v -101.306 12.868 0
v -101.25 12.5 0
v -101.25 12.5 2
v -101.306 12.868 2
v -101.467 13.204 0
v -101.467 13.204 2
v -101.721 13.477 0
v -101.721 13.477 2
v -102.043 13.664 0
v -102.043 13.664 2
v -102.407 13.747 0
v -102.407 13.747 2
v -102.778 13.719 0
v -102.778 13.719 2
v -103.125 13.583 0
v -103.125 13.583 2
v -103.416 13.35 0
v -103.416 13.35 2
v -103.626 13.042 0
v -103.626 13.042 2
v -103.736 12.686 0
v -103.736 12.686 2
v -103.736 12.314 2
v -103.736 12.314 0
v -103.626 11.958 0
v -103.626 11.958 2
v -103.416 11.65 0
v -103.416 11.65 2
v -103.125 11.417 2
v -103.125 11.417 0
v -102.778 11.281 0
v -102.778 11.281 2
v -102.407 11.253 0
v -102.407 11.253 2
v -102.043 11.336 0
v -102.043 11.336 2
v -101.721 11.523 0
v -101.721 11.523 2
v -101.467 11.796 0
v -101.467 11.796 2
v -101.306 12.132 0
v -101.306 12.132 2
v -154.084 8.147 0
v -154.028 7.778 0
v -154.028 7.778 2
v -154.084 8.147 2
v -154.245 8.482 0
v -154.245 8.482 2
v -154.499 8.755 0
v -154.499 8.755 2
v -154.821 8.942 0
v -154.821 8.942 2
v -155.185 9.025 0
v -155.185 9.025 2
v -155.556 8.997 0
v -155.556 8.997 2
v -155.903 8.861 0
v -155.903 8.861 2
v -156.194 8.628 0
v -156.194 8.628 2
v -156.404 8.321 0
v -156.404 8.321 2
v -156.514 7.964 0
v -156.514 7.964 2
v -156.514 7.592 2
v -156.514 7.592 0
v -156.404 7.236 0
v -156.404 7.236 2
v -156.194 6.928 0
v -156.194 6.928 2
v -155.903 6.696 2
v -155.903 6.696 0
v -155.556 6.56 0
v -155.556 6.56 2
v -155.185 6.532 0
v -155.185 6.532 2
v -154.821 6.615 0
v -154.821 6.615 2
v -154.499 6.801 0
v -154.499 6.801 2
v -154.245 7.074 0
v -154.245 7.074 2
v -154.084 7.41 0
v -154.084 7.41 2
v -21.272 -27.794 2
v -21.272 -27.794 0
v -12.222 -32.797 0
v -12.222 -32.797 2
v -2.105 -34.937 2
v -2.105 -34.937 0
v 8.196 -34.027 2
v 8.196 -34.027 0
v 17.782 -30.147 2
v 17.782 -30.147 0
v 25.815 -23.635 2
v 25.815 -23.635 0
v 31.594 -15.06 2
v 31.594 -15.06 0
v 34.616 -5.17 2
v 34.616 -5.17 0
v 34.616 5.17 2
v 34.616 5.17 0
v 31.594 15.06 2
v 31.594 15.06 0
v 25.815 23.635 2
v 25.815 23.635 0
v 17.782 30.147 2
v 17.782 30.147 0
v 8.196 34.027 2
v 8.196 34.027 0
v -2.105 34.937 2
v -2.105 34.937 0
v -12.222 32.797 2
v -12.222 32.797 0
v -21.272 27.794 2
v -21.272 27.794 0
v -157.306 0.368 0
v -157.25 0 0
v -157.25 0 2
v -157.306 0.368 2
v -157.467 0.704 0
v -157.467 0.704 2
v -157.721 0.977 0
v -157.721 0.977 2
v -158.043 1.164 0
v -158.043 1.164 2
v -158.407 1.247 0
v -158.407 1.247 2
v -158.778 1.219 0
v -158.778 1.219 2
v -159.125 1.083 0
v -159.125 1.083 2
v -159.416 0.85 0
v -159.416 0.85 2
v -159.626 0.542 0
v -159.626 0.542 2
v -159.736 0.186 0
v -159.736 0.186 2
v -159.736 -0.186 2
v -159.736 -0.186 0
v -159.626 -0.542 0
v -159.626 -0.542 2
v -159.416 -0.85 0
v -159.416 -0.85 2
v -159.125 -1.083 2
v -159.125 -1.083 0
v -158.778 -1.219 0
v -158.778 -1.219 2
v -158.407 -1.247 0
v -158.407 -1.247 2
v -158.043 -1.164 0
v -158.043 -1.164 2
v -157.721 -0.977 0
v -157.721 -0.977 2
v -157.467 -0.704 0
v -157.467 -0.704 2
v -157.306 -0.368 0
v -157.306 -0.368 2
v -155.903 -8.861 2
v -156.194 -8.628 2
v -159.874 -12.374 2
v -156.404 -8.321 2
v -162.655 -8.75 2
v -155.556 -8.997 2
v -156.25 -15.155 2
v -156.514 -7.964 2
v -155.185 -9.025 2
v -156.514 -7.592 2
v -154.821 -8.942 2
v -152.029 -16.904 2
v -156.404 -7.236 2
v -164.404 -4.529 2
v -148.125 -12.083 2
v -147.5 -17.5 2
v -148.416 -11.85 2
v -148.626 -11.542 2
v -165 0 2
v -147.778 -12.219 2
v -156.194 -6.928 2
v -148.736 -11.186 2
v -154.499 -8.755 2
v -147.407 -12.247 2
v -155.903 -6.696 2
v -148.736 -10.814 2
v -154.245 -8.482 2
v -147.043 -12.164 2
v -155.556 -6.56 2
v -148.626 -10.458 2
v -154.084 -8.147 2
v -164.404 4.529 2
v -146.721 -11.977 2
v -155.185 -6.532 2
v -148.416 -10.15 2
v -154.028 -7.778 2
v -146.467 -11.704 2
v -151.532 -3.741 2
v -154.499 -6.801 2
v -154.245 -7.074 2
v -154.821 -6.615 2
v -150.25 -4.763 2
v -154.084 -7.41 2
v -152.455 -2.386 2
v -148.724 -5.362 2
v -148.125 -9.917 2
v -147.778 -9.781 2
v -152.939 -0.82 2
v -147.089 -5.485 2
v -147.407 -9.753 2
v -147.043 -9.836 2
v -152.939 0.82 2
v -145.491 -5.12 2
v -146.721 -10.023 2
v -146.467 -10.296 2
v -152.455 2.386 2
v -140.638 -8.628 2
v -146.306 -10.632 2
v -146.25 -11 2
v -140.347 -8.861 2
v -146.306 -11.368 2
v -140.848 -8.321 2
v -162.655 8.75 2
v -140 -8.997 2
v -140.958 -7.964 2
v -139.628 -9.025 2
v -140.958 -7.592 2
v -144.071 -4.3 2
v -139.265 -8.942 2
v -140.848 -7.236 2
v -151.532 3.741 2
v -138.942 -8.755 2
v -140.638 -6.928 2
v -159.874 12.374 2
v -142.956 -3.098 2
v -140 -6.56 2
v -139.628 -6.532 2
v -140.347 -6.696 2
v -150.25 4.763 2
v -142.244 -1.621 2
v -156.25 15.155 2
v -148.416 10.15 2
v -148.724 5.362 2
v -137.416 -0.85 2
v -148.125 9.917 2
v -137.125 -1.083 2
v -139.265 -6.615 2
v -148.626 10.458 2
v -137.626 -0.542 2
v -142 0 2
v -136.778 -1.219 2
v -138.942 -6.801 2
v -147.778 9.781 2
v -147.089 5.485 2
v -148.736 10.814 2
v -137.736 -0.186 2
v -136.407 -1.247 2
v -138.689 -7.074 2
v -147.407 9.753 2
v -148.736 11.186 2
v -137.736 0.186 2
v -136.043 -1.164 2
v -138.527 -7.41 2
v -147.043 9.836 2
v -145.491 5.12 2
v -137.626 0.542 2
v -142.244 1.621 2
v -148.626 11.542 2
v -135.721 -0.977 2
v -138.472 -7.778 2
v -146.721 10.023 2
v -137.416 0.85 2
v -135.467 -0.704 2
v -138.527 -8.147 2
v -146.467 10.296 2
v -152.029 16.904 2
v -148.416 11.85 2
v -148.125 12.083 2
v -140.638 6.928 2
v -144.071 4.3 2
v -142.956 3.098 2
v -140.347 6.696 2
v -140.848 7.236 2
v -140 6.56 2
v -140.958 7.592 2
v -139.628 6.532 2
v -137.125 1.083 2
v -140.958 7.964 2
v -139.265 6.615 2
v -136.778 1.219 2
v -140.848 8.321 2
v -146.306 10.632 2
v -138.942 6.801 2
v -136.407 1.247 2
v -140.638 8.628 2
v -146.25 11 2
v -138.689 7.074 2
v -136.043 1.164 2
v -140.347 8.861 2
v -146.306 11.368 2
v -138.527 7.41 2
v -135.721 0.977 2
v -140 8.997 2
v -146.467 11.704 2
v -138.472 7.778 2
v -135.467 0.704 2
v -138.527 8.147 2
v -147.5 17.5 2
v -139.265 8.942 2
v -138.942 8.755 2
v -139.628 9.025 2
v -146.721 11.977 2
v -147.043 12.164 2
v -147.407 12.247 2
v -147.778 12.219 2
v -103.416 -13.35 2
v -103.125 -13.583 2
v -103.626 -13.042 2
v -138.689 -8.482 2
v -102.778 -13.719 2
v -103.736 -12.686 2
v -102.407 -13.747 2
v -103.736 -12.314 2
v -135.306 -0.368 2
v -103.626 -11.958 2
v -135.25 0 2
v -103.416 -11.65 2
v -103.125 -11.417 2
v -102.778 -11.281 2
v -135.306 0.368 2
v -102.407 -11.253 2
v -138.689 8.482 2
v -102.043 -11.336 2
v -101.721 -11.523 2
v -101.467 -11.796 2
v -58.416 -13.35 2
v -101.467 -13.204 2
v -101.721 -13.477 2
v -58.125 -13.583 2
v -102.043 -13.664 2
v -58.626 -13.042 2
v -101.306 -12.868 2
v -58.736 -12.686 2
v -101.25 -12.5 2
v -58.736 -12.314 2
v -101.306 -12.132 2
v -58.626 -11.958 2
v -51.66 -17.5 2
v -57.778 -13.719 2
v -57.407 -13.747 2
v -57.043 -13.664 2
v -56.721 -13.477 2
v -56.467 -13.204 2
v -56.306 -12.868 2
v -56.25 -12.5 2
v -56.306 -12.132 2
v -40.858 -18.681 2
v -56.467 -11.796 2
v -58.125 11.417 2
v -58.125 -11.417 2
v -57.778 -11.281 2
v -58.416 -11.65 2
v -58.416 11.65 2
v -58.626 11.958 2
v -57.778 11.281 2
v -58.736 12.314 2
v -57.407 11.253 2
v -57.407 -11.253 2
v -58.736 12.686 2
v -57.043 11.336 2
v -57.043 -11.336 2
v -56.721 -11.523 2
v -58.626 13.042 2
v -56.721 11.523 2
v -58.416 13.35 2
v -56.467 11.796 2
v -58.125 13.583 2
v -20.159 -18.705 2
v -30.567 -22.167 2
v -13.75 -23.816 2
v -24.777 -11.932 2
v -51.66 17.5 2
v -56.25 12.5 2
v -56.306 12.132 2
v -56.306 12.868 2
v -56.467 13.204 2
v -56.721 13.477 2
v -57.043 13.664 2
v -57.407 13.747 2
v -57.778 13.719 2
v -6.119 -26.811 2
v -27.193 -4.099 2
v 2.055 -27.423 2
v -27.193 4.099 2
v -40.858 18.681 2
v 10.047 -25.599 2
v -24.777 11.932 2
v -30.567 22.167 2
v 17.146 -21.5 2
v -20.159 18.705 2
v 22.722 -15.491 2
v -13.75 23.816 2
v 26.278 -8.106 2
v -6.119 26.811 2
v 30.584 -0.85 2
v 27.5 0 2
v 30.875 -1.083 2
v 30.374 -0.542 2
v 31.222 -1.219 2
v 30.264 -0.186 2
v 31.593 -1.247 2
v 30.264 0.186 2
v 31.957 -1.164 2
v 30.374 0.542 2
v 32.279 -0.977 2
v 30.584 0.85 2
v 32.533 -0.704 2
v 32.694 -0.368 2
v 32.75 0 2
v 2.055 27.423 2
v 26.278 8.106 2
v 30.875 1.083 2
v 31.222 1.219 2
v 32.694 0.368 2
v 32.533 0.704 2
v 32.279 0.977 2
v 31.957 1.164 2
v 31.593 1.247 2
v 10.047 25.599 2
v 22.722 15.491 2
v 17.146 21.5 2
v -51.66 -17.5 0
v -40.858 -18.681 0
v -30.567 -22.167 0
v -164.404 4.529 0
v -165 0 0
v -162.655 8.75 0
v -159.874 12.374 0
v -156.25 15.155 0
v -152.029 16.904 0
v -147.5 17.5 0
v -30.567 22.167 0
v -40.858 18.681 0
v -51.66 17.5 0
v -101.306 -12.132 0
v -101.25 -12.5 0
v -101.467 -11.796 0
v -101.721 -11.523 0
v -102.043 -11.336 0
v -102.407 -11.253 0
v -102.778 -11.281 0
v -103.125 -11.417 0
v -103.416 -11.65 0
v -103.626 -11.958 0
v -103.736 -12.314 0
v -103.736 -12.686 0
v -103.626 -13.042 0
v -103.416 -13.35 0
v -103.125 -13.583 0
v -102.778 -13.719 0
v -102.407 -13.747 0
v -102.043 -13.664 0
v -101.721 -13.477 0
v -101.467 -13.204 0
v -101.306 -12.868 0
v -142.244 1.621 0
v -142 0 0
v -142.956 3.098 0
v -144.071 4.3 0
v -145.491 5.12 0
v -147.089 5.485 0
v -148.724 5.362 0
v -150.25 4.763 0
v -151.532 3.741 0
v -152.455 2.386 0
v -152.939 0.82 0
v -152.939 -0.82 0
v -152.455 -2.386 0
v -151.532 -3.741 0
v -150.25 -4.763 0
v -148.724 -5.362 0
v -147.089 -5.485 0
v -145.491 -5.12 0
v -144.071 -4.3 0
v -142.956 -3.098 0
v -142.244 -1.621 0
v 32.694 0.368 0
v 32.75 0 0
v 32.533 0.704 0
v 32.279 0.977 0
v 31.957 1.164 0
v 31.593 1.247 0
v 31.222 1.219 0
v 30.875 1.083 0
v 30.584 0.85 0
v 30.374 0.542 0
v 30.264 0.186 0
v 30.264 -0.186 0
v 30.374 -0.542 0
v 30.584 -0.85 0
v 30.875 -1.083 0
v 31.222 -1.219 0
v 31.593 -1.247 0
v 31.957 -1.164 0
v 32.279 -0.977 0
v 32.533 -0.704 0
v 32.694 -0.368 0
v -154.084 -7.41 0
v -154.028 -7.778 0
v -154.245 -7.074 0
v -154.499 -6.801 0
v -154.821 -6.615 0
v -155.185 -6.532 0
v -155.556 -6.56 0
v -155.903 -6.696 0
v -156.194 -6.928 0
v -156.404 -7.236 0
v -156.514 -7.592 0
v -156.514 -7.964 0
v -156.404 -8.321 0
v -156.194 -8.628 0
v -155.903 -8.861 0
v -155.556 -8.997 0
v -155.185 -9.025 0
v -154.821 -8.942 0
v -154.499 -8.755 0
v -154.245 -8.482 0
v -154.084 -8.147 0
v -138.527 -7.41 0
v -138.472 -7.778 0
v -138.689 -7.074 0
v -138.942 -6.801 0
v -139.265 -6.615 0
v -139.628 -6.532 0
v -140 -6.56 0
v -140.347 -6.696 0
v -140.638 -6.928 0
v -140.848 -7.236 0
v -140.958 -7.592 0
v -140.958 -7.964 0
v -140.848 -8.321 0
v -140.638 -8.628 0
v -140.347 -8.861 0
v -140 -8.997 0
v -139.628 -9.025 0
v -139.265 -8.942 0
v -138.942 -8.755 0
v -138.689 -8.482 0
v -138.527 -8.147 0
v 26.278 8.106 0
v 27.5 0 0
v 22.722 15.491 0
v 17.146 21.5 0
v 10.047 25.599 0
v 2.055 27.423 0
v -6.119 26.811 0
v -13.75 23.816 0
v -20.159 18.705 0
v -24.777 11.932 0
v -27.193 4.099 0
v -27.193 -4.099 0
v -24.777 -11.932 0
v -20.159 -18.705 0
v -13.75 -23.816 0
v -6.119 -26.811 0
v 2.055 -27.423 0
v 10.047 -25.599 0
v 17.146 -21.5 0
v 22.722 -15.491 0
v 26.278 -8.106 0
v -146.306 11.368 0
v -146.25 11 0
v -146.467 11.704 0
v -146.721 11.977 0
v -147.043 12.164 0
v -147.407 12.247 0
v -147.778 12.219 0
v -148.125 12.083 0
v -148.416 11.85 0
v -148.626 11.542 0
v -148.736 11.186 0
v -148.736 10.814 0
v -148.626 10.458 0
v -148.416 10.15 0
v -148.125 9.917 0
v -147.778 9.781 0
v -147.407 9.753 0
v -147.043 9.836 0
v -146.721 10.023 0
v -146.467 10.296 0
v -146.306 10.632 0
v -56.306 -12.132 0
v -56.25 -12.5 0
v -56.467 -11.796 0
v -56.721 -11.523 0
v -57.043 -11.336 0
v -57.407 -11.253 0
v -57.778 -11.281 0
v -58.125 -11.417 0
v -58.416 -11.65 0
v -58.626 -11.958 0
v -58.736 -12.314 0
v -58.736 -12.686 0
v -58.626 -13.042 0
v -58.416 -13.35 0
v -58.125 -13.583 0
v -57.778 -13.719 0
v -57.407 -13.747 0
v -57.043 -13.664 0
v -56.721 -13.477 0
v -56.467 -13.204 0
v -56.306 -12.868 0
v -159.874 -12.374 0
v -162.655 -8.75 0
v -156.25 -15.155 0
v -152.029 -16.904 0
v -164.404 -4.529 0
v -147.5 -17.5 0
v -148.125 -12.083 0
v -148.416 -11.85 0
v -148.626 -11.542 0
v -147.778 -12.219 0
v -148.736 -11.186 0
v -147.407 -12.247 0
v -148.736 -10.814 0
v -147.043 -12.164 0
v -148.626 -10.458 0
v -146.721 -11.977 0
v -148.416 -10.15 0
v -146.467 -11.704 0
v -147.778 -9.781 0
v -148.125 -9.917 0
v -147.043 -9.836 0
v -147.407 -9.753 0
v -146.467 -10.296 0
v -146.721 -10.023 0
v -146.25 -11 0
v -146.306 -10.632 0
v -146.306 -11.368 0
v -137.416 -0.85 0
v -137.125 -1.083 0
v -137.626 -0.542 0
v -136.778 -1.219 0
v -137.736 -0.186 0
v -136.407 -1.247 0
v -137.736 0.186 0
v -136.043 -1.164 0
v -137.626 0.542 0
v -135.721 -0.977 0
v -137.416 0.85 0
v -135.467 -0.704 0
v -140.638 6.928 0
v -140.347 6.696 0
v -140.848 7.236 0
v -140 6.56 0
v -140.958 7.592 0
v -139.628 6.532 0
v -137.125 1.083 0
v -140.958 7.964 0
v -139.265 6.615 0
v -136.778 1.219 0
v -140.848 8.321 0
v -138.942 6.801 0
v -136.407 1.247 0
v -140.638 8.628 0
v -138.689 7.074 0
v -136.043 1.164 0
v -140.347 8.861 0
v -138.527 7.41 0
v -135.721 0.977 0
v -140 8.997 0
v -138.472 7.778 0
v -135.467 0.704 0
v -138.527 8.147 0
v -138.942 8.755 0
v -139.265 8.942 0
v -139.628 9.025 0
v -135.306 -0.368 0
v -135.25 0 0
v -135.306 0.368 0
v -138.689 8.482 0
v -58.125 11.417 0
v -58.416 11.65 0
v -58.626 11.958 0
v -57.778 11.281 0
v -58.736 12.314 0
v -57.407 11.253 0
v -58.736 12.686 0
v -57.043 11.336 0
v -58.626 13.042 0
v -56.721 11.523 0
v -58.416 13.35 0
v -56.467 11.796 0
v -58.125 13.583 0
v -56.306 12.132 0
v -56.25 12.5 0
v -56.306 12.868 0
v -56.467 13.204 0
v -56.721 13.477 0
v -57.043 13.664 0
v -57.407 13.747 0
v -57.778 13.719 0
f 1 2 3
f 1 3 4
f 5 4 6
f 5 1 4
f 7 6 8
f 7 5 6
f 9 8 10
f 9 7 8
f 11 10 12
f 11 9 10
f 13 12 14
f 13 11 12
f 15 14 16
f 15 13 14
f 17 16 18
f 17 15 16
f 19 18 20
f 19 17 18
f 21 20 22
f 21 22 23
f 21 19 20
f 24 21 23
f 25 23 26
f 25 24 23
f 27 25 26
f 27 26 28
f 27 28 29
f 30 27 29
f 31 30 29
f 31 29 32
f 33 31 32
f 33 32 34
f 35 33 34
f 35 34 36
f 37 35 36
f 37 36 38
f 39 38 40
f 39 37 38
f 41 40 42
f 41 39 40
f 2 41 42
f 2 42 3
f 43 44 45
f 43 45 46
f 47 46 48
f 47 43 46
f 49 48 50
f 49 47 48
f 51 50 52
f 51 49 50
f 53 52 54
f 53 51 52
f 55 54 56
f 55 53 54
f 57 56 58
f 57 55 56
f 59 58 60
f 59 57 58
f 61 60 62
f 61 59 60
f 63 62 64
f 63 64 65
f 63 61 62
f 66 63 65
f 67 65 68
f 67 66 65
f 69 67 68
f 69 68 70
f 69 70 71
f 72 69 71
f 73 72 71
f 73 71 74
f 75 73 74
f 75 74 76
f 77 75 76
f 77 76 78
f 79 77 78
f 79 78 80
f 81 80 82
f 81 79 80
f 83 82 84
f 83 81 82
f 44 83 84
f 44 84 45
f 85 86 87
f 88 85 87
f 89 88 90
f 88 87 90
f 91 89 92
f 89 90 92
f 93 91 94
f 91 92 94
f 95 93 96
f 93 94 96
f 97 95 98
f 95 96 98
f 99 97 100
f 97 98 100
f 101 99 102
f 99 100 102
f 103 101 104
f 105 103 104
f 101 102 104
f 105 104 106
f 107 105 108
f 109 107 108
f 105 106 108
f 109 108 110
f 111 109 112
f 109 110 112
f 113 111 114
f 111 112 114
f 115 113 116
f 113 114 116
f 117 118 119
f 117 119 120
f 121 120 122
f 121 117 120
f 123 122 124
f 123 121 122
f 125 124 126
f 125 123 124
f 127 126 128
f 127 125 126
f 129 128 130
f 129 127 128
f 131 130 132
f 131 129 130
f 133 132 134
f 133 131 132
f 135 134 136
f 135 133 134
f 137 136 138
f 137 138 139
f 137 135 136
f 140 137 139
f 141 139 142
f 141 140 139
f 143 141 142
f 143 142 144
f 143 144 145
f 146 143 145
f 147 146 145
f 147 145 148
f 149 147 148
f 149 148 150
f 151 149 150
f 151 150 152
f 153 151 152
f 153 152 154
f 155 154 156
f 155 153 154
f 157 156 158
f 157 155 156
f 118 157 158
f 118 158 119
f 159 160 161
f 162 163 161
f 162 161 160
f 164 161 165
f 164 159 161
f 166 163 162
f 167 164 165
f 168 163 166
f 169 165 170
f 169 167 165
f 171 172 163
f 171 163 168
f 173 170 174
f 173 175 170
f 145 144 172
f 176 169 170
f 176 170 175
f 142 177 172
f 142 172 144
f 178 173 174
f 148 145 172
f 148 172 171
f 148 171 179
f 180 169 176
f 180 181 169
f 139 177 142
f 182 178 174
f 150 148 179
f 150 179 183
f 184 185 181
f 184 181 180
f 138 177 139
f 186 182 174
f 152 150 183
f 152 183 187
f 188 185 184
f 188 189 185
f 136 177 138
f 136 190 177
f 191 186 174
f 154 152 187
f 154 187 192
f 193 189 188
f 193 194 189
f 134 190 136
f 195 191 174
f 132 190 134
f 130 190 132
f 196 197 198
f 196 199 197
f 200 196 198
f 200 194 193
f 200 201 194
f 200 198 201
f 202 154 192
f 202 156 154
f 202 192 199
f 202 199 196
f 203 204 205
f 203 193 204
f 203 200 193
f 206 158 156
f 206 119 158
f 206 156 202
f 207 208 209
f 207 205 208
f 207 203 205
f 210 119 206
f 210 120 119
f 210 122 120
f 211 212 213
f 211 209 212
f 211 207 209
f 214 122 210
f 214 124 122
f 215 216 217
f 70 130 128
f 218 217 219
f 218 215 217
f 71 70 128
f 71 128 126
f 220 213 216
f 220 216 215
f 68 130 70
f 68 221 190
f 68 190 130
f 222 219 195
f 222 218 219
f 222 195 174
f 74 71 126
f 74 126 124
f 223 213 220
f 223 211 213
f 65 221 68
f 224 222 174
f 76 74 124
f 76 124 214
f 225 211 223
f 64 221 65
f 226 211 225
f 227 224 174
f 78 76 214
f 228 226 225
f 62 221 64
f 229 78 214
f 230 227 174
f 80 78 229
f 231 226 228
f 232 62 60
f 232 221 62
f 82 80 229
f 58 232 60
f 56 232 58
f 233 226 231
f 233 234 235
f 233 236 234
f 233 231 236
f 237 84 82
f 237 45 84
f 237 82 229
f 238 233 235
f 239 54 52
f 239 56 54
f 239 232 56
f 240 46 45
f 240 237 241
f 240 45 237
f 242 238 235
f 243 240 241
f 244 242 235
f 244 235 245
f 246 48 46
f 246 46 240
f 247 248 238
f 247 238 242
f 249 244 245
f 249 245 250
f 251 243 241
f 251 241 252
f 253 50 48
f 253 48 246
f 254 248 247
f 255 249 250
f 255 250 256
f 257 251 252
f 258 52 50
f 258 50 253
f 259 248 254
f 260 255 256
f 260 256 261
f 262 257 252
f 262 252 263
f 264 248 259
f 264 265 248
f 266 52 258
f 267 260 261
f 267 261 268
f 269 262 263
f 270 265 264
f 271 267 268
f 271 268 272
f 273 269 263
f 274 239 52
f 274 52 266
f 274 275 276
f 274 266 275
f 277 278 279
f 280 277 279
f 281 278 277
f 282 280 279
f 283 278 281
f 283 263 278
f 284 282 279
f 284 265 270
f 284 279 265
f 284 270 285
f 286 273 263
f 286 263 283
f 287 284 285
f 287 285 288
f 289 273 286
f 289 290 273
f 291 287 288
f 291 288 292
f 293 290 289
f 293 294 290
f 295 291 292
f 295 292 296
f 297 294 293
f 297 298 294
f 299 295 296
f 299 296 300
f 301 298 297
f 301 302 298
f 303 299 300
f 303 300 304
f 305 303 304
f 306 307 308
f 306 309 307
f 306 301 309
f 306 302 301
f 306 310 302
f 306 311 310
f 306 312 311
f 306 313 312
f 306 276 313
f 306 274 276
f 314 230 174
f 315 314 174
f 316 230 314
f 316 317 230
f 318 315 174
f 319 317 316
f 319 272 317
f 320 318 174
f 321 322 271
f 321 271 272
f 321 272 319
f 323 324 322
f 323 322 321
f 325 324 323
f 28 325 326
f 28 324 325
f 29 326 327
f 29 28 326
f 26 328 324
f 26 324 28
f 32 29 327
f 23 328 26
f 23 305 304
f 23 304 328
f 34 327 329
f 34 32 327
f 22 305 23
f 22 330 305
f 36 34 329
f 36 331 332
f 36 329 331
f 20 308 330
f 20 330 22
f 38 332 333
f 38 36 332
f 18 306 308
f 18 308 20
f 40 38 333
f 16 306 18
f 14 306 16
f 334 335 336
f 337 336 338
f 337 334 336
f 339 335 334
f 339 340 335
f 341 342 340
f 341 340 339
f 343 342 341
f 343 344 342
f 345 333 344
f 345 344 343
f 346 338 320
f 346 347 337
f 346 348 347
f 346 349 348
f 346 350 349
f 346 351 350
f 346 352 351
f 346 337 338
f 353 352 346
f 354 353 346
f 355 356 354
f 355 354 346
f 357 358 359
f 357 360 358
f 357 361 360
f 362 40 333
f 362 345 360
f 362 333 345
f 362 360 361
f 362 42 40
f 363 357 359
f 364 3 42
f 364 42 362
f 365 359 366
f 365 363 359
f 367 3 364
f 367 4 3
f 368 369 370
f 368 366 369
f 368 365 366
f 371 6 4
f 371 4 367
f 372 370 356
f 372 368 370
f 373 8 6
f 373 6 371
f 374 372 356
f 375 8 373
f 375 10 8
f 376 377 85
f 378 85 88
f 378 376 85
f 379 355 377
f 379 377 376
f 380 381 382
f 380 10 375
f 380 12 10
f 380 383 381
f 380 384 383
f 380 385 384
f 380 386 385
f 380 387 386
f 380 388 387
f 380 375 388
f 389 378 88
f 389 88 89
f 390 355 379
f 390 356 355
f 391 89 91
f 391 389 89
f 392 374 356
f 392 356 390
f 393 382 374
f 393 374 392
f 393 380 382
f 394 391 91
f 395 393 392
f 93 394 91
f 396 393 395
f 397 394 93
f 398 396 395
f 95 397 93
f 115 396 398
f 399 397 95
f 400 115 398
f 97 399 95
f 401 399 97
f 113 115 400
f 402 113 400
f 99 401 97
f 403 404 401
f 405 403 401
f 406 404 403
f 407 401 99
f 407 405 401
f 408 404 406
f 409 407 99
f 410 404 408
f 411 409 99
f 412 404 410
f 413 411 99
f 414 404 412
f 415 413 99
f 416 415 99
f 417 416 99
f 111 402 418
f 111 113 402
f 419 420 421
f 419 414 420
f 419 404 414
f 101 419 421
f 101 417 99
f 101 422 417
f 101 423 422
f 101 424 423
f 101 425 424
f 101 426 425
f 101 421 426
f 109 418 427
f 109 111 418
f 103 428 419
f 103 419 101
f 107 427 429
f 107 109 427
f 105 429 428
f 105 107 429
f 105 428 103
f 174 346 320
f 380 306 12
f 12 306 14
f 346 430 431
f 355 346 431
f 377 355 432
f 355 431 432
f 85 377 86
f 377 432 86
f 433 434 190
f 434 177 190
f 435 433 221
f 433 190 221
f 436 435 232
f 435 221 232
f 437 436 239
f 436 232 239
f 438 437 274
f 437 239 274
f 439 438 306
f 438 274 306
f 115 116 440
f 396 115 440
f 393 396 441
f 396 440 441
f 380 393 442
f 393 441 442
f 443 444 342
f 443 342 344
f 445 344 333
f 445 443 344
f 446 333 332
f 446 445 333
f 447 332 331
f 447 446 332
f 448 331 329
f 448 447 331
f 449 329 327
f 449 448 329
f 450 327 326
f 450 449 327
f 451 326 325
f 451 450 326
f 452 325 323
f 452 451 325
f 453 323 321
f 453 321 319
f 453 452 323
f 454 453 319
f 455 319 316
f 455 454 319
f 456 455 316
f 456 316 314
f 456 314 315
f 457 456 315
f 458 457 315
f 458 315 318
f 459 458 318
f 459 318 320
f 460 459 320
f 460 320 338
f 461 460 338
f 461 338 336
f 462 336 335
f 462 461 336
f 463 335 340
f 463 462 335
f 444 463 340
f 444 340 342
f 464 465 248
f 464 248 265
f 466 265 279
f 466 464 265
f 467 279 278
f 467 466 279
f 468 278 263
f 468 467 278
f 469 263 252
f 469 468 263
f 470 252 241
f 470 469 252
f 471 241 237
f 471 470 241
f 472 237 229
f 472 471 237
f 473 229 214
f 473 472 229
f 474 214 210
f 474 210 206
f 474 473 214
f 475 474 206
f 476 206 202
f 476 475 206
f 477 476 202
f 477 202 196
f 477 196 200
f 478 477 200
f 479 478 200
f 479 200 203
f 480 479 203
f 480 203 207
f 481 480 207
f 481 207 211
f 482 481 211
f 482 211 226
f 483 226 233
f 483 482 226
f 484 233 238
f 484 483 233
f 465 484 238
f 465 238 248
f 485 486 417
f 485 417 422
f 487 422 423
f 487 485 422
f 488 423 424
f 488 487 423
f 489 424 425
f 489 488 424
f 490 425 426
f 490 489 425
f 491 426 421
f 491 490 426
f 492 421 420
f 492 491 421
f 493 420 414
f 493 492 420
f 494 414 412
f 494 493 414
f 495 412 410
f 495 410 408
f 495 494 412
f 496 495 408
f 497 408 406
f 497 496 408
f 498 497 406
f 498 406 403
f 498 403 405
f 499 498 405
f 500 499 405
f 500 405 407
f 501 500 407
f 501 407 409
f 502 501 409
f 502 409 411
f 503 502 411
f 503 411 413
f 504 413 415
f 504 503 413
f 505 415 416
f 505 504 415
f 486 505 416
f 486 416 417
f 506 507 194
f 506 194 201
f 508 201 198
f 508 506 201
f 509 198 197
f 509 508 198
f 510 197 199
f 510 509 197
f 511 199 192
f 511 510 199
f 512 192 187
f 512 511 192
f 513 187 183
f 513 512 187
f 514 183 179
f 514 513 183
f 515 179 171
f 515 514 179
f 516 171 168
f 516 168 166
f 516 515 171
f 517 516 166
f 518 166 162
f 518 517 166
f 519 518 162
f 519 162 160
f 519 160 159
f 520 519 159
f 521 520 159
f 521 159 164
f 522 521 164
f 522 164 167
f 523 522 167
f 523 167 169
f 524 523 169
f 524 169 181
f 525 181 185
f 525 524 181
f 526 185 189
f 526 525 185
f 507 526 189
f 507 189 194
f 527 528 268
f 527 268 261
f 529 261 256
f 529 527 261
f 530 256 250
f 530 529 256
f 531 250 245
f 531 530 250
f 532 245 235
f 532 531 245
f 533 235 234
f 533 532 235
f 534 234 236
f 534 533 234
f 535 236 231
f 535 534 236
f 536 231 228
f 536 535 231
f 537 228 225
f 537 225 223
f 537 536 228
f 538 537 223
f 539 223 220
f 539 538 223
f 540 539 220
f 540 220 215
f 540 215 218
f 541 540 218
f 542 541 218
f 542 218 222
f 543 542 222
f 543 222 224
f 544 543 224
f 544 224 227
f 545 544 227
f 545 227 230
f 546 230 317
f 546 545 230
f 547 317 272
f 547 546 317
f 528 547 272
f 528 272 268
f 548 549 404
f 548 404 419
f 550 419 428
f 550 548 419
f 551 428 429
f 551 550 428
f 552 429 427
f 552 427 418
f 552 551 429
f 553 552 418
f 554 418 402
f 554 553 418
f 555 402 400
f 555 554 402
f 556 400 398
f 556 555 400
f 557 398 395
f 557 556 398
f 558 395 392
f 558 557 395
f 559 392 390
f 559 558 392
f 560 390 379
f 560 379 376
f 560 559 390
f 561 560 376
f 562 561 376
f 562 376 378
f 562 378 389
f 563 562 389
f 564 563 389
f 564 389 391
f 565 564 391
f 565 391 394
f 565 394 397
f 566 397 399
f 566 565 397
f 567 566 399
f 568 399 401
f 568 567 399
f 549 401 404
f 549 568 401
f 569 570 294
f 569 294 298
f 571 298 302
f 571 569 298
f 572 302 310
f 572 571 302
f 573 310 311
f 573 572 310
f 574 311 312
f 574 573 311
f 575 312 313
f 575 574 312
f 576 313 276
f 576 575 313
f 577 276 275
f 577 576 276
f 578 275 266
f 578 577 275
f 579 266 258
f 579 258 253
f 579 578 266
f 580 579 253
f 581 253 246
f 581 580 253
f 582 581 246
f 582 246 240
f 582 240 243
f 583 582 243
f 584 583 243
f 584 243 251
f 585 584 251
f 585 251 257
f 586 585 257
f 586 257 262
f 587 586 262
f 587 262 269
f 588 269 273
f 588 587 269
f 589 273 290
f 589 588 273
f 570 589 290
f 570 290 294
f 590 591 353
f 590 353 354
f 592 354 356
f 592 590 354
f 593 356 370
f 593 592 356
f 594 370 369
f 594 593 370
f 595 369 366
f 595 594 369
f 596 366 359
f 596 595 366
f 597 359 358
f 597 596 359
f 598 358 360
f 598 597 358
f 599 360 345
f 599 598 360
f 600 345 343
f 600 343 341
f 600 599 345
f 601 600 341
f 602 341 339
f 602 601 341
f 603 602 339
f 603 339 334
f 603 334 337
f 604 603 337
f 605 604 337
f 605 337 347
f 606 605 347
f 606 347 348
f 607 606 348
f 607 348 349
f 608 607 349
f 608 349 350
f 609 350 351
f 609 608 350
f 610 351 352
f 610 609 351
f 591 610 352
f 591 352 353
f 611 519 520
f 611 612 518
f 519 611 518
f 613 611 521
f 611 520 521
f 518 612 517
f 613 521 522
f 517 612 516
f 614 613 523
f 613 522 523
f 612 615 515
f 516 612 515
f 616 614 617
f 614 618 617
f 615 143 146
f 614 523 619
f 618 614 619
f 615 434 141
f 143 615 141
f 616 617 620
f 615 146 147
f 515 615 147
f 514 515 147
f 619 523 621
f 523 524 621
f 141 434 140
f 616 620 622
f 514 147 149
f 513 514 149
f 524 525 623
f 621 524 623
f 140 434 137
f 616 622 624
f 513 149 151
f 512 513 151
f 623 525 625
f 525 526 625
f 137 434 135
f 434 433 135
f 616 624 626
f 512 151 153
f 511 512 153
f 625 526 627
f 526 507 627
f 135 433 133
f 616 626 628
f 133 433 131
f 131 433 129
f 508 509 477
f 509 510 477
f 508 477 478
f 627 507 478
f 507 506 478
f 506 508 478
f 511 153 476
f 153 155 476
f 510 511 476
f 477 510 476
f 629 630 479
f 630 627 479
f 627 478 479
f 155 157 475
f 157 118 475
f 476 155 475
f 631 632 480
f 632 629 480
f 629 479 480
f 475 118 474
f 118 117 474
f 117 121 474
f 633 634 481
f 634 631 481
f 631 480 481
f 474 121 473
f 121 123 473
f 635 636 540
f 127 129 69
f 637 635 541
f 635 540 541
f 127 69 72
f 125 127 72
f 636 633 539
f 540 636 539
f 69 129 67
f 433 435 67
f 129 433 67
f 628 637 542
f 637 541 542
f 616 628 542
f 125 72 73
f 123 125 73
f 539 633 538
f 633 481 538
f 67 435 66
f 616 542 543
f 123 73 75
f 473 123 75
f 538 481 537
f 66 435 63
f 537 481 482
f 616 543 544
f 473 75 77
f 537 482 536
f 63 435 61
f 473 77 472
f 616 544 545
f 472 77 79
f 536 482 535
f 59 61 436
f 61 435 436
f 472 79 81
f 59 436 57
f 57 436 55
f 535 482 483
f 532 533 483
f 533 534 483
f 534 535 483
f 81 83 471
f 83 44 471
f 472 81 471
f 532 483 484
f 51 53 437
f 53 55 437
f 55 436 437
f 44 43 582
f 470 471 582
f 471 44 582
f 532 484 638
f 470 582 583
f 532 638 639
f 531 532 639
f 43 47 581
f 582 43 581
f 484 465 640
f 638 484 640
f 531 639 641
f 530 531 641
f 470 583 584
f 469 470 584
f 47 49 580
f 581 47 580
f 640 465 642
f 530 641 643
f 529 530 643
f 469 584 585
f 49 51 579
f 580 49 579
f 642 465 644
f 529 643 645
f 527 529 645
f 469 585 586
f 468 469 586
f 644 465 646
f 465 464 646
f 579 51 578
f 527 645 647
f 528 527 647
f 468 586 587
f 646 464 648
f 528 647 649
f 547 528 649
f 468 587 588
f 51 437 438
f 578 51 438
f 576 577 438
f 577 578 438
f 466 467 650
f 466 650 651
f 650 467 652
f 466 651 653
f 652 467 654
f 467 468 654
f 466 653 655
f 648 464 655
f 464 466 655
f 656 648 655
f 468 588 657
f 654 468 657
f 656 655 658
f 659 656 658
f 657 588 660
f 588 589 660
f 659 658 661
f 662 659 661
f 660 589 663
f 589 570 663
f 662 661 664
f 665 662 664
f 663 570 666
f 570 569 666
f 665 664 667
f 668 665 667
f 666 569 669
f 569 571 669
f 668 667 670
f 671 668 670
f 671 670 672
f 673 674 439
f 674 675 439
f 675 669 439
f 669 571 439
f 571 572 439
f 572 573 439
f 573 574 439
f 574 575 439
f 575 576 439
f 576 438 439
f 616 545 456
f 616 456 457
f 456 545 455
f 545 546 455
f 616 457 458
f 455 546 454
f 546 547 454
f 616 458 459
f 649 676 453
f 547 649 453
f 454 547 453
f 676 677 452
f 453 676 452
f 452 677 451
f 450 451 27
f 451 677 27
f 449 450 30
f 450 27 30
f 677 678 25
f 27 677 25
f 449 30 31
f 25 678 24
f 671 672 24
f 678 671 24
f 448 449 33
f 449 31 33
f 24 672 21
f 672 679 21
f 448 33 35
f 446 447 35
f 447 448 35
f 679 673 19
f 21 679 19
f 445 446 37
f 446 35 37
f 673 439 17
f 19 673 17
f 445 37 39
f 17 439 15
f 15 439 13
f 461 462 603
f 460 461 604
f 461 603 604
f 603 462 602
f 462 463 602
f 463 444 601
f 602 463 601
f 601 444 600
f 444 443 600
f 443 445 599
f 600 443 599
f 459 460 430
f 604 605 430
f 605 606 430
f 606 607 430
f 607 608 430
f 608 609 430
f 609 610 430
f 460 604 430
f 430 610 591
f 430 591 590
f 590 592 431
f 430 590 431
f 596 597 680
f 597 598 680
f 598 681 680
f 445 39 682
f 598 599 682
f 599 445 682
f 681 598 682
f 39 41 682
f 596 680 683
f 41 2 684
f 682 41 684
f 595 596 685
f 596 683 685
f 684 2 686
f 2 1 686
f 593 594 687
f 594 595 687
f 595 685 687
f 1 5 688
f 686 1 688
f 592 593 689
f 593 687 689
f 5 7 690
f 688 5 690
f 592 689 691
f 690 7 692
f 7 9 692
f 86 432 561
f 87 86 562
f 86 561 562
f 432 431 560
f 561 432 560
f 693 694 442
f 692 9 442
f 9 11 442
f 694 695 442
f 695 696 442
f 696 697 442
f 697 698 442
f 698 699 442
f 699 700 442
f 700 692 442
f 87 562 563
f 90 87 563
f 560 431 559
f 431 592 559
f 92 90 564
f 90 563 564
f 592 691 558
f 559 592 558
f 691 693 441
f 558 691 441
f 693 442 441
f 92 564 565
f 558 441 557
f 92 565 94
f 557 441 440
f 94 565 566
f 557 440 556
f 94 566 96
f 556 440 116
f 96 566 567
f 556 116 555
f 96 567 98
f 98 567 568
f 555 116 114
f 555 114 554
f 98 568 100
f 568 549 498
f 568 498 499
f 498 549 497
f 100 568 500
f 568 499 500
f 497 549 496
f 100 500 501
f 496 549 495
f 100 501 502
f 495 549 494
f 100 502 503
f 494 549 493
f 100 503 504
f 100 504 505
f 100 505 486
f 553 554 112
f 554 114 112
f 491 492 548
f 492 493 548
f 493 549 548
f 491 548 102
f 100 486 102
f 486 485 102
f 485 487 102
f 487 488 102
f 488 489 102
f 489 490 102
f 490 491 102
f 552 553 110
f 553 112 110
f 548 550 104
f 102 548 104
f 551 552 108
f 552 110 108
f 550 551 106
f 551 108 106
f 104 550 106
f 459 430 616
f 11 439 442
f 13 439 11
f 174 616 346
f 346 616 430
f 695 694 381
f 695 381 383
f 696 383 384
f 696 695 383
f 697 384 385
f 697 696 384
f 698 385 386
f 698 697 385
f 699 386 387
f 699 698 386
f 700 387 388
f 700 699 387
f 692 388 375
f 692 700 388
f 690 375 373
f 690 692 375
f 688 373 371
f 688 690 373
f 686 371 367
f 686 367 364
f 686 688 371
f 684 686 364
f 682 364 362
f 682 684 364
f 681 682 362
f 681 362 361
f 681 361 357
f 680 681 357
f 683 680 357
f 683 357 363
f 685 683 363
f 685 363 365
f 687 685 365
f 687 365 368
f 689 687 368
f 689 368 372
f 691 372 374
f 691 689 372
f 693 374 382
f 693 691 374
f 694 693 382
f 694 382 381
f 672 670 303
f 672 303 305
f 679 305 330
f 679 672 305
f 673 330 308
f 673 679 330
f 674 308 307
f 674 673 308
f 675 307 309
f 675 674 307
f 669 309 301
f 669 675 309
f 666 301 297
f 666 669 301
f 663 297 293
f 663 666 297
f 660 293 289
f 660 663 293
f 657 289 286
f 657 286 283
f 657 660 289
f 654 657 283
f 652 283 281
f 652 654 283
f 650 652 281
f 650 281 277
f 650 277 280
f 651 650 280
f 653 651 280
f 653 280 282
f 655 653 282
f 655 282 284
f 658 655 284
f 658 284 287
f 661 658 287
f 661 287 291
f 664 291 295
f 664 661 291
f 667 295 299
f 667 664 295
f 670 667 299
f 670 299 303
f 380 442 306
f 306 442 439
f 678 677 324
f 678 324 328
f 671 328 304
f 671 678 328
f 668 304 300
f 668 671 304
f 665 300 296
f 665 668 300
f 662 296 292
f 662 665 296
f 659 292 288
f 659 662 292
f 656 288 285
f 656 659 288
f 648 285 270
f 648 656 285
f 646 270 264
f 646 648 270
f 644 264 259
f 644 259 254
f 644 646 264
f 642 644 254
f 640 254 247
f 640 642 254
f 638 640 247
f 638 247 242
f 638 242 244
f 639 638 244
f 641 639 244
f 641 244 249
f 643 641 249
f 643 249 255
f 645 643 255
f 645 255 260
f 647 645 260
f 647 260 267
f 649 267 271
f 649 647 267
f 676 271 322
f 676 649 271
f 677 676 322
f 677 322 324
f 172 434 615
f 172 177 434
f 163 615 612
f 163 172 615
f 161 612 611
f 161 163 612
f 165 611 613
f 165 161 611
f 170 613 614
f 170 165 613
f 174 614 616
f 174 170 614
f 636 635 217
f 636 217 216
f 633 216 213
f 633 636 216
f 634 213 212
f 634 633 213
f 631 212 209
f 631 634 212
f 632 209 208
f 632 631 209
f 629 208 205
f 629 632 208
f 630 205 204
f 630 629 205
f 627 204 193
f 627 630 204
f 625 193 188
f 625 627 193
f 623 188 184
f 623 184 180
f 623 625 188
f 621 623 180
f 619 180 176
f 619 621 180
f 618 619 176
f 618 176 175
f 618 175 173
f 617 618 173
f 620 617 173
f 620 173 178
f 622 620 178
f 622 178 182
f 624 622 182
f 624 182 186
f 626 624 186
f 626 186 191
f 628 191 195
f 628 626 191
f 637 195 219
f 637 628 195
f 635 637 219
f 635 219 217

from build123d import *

# Parameters (mm, degrees)
ESBO_O1_R                = 27.5
ESBO_O1_R_2              = 5.5
ESBO_O1_R_3              = 1.25
RESSALTO_EXTRUS_O1_DEPTH = 2
FILETE1_R                = 17.5


with BuildPart() as part:
    # Esboço1 → Ressalto-extrusão1 (new body)
    with BuildSketch(Plane.XY):
        with BuildLine():
            Line((-165, 17.5), (-165, -17.5))
            Line((-165, -17.5), (-51.659945799, -17.5))
            ThreePointArc((-51.659945799, -17.5), (-35.617722101, -20.143405329), (-21.271742388, -27.794117647))
            ThreePointArc((-21.271742388, -27.794117647), (35, 0), (-21.271742388, 27.794117647))
            ThreePointArc((-21.271742388, 27.794117647), (-35.617722101, 20.143405329), (-51.659945799, 17.5))
            Line((-51.659945799, 17.5), (-165, 17.5))
        make_face()
        Circle(ESBO_O1_R, mode=Mode.SUBTRACT)
        with Locations((-147.5, 0)):
            Circle(ESBO_O1_R_2, mode=Mode.SUBTRACT)
        with Locations((-147.5, 11)):
            Circle(ESBO_O1_R_3, mode=Mode.SUBTRACT)
        with Locations((-139.721825407, 7.778174593)):
            Circle(ESBO_O1_R_3, mode=Mode.SUBTRACT)
        with Locations((-136.5, 0)):
            Circle(ESBO_O1_R_3, mode=Mode.SUBTRACT)
        with Locations((-139.721825407, -7.778174593)):
            Circle(ESBO_O1_R_3, mode=Mode.SUBTRACT)
        with Locations((-147.5, -11)):
            Circle(ESBO_O1_R_3, mode=Mode.SUBTRACT)
        with Locations((-155.278174593, -7.778174593)):
            Circle(ESBO_O1_R_3, mode=Mode.SUBTRACT)
        with Locations((-158.5, 0)):
            Circle(ESBO_O1_R_3, mode=Mode.SUBTRACT)
        with Locations((-155.278174593, 7.778174593)):
            Circle(ESBO_O1_R_3, mode=Mode.SUBTRACT)
        with Locations((31.5, 0)):
            Circle(ESBO_O1_R_3, mode=Mode.SUBTRACT)
        with Locations((-57.5, 12.5)):
            Circle(ESBO_O1_R_3, mode=Mode.SUBTRACT)
        with Locations((-102.5, 12.5)):
            Circle(ESBO_O1_R_3, mode=Mode.SUBTRACT)
        with Locations((-102.5, -12.5)):
            Circle(ESBO_O1_R_3, mode=Mode.SUBTRACT)
        with Locations((-57.5, -12.5)):
            Circle(ESBO_O1_R_3, mode=Mode.SUBTRACT)
    extrude(amount=RESSALTO_EXTRUS_O1_DEPTH)

    # Filete1
    filete1_edges = [part.edges().sort_by_distance(p)[0] for p in [
        (-165, -17.5, 1),
        (-165, 17.5, 1),
    ]]
    fillet(filete1_edges, radius=FILETE1_R - 0.0001)  # a hair under: the kernel refuses the full size


solid = part.part
